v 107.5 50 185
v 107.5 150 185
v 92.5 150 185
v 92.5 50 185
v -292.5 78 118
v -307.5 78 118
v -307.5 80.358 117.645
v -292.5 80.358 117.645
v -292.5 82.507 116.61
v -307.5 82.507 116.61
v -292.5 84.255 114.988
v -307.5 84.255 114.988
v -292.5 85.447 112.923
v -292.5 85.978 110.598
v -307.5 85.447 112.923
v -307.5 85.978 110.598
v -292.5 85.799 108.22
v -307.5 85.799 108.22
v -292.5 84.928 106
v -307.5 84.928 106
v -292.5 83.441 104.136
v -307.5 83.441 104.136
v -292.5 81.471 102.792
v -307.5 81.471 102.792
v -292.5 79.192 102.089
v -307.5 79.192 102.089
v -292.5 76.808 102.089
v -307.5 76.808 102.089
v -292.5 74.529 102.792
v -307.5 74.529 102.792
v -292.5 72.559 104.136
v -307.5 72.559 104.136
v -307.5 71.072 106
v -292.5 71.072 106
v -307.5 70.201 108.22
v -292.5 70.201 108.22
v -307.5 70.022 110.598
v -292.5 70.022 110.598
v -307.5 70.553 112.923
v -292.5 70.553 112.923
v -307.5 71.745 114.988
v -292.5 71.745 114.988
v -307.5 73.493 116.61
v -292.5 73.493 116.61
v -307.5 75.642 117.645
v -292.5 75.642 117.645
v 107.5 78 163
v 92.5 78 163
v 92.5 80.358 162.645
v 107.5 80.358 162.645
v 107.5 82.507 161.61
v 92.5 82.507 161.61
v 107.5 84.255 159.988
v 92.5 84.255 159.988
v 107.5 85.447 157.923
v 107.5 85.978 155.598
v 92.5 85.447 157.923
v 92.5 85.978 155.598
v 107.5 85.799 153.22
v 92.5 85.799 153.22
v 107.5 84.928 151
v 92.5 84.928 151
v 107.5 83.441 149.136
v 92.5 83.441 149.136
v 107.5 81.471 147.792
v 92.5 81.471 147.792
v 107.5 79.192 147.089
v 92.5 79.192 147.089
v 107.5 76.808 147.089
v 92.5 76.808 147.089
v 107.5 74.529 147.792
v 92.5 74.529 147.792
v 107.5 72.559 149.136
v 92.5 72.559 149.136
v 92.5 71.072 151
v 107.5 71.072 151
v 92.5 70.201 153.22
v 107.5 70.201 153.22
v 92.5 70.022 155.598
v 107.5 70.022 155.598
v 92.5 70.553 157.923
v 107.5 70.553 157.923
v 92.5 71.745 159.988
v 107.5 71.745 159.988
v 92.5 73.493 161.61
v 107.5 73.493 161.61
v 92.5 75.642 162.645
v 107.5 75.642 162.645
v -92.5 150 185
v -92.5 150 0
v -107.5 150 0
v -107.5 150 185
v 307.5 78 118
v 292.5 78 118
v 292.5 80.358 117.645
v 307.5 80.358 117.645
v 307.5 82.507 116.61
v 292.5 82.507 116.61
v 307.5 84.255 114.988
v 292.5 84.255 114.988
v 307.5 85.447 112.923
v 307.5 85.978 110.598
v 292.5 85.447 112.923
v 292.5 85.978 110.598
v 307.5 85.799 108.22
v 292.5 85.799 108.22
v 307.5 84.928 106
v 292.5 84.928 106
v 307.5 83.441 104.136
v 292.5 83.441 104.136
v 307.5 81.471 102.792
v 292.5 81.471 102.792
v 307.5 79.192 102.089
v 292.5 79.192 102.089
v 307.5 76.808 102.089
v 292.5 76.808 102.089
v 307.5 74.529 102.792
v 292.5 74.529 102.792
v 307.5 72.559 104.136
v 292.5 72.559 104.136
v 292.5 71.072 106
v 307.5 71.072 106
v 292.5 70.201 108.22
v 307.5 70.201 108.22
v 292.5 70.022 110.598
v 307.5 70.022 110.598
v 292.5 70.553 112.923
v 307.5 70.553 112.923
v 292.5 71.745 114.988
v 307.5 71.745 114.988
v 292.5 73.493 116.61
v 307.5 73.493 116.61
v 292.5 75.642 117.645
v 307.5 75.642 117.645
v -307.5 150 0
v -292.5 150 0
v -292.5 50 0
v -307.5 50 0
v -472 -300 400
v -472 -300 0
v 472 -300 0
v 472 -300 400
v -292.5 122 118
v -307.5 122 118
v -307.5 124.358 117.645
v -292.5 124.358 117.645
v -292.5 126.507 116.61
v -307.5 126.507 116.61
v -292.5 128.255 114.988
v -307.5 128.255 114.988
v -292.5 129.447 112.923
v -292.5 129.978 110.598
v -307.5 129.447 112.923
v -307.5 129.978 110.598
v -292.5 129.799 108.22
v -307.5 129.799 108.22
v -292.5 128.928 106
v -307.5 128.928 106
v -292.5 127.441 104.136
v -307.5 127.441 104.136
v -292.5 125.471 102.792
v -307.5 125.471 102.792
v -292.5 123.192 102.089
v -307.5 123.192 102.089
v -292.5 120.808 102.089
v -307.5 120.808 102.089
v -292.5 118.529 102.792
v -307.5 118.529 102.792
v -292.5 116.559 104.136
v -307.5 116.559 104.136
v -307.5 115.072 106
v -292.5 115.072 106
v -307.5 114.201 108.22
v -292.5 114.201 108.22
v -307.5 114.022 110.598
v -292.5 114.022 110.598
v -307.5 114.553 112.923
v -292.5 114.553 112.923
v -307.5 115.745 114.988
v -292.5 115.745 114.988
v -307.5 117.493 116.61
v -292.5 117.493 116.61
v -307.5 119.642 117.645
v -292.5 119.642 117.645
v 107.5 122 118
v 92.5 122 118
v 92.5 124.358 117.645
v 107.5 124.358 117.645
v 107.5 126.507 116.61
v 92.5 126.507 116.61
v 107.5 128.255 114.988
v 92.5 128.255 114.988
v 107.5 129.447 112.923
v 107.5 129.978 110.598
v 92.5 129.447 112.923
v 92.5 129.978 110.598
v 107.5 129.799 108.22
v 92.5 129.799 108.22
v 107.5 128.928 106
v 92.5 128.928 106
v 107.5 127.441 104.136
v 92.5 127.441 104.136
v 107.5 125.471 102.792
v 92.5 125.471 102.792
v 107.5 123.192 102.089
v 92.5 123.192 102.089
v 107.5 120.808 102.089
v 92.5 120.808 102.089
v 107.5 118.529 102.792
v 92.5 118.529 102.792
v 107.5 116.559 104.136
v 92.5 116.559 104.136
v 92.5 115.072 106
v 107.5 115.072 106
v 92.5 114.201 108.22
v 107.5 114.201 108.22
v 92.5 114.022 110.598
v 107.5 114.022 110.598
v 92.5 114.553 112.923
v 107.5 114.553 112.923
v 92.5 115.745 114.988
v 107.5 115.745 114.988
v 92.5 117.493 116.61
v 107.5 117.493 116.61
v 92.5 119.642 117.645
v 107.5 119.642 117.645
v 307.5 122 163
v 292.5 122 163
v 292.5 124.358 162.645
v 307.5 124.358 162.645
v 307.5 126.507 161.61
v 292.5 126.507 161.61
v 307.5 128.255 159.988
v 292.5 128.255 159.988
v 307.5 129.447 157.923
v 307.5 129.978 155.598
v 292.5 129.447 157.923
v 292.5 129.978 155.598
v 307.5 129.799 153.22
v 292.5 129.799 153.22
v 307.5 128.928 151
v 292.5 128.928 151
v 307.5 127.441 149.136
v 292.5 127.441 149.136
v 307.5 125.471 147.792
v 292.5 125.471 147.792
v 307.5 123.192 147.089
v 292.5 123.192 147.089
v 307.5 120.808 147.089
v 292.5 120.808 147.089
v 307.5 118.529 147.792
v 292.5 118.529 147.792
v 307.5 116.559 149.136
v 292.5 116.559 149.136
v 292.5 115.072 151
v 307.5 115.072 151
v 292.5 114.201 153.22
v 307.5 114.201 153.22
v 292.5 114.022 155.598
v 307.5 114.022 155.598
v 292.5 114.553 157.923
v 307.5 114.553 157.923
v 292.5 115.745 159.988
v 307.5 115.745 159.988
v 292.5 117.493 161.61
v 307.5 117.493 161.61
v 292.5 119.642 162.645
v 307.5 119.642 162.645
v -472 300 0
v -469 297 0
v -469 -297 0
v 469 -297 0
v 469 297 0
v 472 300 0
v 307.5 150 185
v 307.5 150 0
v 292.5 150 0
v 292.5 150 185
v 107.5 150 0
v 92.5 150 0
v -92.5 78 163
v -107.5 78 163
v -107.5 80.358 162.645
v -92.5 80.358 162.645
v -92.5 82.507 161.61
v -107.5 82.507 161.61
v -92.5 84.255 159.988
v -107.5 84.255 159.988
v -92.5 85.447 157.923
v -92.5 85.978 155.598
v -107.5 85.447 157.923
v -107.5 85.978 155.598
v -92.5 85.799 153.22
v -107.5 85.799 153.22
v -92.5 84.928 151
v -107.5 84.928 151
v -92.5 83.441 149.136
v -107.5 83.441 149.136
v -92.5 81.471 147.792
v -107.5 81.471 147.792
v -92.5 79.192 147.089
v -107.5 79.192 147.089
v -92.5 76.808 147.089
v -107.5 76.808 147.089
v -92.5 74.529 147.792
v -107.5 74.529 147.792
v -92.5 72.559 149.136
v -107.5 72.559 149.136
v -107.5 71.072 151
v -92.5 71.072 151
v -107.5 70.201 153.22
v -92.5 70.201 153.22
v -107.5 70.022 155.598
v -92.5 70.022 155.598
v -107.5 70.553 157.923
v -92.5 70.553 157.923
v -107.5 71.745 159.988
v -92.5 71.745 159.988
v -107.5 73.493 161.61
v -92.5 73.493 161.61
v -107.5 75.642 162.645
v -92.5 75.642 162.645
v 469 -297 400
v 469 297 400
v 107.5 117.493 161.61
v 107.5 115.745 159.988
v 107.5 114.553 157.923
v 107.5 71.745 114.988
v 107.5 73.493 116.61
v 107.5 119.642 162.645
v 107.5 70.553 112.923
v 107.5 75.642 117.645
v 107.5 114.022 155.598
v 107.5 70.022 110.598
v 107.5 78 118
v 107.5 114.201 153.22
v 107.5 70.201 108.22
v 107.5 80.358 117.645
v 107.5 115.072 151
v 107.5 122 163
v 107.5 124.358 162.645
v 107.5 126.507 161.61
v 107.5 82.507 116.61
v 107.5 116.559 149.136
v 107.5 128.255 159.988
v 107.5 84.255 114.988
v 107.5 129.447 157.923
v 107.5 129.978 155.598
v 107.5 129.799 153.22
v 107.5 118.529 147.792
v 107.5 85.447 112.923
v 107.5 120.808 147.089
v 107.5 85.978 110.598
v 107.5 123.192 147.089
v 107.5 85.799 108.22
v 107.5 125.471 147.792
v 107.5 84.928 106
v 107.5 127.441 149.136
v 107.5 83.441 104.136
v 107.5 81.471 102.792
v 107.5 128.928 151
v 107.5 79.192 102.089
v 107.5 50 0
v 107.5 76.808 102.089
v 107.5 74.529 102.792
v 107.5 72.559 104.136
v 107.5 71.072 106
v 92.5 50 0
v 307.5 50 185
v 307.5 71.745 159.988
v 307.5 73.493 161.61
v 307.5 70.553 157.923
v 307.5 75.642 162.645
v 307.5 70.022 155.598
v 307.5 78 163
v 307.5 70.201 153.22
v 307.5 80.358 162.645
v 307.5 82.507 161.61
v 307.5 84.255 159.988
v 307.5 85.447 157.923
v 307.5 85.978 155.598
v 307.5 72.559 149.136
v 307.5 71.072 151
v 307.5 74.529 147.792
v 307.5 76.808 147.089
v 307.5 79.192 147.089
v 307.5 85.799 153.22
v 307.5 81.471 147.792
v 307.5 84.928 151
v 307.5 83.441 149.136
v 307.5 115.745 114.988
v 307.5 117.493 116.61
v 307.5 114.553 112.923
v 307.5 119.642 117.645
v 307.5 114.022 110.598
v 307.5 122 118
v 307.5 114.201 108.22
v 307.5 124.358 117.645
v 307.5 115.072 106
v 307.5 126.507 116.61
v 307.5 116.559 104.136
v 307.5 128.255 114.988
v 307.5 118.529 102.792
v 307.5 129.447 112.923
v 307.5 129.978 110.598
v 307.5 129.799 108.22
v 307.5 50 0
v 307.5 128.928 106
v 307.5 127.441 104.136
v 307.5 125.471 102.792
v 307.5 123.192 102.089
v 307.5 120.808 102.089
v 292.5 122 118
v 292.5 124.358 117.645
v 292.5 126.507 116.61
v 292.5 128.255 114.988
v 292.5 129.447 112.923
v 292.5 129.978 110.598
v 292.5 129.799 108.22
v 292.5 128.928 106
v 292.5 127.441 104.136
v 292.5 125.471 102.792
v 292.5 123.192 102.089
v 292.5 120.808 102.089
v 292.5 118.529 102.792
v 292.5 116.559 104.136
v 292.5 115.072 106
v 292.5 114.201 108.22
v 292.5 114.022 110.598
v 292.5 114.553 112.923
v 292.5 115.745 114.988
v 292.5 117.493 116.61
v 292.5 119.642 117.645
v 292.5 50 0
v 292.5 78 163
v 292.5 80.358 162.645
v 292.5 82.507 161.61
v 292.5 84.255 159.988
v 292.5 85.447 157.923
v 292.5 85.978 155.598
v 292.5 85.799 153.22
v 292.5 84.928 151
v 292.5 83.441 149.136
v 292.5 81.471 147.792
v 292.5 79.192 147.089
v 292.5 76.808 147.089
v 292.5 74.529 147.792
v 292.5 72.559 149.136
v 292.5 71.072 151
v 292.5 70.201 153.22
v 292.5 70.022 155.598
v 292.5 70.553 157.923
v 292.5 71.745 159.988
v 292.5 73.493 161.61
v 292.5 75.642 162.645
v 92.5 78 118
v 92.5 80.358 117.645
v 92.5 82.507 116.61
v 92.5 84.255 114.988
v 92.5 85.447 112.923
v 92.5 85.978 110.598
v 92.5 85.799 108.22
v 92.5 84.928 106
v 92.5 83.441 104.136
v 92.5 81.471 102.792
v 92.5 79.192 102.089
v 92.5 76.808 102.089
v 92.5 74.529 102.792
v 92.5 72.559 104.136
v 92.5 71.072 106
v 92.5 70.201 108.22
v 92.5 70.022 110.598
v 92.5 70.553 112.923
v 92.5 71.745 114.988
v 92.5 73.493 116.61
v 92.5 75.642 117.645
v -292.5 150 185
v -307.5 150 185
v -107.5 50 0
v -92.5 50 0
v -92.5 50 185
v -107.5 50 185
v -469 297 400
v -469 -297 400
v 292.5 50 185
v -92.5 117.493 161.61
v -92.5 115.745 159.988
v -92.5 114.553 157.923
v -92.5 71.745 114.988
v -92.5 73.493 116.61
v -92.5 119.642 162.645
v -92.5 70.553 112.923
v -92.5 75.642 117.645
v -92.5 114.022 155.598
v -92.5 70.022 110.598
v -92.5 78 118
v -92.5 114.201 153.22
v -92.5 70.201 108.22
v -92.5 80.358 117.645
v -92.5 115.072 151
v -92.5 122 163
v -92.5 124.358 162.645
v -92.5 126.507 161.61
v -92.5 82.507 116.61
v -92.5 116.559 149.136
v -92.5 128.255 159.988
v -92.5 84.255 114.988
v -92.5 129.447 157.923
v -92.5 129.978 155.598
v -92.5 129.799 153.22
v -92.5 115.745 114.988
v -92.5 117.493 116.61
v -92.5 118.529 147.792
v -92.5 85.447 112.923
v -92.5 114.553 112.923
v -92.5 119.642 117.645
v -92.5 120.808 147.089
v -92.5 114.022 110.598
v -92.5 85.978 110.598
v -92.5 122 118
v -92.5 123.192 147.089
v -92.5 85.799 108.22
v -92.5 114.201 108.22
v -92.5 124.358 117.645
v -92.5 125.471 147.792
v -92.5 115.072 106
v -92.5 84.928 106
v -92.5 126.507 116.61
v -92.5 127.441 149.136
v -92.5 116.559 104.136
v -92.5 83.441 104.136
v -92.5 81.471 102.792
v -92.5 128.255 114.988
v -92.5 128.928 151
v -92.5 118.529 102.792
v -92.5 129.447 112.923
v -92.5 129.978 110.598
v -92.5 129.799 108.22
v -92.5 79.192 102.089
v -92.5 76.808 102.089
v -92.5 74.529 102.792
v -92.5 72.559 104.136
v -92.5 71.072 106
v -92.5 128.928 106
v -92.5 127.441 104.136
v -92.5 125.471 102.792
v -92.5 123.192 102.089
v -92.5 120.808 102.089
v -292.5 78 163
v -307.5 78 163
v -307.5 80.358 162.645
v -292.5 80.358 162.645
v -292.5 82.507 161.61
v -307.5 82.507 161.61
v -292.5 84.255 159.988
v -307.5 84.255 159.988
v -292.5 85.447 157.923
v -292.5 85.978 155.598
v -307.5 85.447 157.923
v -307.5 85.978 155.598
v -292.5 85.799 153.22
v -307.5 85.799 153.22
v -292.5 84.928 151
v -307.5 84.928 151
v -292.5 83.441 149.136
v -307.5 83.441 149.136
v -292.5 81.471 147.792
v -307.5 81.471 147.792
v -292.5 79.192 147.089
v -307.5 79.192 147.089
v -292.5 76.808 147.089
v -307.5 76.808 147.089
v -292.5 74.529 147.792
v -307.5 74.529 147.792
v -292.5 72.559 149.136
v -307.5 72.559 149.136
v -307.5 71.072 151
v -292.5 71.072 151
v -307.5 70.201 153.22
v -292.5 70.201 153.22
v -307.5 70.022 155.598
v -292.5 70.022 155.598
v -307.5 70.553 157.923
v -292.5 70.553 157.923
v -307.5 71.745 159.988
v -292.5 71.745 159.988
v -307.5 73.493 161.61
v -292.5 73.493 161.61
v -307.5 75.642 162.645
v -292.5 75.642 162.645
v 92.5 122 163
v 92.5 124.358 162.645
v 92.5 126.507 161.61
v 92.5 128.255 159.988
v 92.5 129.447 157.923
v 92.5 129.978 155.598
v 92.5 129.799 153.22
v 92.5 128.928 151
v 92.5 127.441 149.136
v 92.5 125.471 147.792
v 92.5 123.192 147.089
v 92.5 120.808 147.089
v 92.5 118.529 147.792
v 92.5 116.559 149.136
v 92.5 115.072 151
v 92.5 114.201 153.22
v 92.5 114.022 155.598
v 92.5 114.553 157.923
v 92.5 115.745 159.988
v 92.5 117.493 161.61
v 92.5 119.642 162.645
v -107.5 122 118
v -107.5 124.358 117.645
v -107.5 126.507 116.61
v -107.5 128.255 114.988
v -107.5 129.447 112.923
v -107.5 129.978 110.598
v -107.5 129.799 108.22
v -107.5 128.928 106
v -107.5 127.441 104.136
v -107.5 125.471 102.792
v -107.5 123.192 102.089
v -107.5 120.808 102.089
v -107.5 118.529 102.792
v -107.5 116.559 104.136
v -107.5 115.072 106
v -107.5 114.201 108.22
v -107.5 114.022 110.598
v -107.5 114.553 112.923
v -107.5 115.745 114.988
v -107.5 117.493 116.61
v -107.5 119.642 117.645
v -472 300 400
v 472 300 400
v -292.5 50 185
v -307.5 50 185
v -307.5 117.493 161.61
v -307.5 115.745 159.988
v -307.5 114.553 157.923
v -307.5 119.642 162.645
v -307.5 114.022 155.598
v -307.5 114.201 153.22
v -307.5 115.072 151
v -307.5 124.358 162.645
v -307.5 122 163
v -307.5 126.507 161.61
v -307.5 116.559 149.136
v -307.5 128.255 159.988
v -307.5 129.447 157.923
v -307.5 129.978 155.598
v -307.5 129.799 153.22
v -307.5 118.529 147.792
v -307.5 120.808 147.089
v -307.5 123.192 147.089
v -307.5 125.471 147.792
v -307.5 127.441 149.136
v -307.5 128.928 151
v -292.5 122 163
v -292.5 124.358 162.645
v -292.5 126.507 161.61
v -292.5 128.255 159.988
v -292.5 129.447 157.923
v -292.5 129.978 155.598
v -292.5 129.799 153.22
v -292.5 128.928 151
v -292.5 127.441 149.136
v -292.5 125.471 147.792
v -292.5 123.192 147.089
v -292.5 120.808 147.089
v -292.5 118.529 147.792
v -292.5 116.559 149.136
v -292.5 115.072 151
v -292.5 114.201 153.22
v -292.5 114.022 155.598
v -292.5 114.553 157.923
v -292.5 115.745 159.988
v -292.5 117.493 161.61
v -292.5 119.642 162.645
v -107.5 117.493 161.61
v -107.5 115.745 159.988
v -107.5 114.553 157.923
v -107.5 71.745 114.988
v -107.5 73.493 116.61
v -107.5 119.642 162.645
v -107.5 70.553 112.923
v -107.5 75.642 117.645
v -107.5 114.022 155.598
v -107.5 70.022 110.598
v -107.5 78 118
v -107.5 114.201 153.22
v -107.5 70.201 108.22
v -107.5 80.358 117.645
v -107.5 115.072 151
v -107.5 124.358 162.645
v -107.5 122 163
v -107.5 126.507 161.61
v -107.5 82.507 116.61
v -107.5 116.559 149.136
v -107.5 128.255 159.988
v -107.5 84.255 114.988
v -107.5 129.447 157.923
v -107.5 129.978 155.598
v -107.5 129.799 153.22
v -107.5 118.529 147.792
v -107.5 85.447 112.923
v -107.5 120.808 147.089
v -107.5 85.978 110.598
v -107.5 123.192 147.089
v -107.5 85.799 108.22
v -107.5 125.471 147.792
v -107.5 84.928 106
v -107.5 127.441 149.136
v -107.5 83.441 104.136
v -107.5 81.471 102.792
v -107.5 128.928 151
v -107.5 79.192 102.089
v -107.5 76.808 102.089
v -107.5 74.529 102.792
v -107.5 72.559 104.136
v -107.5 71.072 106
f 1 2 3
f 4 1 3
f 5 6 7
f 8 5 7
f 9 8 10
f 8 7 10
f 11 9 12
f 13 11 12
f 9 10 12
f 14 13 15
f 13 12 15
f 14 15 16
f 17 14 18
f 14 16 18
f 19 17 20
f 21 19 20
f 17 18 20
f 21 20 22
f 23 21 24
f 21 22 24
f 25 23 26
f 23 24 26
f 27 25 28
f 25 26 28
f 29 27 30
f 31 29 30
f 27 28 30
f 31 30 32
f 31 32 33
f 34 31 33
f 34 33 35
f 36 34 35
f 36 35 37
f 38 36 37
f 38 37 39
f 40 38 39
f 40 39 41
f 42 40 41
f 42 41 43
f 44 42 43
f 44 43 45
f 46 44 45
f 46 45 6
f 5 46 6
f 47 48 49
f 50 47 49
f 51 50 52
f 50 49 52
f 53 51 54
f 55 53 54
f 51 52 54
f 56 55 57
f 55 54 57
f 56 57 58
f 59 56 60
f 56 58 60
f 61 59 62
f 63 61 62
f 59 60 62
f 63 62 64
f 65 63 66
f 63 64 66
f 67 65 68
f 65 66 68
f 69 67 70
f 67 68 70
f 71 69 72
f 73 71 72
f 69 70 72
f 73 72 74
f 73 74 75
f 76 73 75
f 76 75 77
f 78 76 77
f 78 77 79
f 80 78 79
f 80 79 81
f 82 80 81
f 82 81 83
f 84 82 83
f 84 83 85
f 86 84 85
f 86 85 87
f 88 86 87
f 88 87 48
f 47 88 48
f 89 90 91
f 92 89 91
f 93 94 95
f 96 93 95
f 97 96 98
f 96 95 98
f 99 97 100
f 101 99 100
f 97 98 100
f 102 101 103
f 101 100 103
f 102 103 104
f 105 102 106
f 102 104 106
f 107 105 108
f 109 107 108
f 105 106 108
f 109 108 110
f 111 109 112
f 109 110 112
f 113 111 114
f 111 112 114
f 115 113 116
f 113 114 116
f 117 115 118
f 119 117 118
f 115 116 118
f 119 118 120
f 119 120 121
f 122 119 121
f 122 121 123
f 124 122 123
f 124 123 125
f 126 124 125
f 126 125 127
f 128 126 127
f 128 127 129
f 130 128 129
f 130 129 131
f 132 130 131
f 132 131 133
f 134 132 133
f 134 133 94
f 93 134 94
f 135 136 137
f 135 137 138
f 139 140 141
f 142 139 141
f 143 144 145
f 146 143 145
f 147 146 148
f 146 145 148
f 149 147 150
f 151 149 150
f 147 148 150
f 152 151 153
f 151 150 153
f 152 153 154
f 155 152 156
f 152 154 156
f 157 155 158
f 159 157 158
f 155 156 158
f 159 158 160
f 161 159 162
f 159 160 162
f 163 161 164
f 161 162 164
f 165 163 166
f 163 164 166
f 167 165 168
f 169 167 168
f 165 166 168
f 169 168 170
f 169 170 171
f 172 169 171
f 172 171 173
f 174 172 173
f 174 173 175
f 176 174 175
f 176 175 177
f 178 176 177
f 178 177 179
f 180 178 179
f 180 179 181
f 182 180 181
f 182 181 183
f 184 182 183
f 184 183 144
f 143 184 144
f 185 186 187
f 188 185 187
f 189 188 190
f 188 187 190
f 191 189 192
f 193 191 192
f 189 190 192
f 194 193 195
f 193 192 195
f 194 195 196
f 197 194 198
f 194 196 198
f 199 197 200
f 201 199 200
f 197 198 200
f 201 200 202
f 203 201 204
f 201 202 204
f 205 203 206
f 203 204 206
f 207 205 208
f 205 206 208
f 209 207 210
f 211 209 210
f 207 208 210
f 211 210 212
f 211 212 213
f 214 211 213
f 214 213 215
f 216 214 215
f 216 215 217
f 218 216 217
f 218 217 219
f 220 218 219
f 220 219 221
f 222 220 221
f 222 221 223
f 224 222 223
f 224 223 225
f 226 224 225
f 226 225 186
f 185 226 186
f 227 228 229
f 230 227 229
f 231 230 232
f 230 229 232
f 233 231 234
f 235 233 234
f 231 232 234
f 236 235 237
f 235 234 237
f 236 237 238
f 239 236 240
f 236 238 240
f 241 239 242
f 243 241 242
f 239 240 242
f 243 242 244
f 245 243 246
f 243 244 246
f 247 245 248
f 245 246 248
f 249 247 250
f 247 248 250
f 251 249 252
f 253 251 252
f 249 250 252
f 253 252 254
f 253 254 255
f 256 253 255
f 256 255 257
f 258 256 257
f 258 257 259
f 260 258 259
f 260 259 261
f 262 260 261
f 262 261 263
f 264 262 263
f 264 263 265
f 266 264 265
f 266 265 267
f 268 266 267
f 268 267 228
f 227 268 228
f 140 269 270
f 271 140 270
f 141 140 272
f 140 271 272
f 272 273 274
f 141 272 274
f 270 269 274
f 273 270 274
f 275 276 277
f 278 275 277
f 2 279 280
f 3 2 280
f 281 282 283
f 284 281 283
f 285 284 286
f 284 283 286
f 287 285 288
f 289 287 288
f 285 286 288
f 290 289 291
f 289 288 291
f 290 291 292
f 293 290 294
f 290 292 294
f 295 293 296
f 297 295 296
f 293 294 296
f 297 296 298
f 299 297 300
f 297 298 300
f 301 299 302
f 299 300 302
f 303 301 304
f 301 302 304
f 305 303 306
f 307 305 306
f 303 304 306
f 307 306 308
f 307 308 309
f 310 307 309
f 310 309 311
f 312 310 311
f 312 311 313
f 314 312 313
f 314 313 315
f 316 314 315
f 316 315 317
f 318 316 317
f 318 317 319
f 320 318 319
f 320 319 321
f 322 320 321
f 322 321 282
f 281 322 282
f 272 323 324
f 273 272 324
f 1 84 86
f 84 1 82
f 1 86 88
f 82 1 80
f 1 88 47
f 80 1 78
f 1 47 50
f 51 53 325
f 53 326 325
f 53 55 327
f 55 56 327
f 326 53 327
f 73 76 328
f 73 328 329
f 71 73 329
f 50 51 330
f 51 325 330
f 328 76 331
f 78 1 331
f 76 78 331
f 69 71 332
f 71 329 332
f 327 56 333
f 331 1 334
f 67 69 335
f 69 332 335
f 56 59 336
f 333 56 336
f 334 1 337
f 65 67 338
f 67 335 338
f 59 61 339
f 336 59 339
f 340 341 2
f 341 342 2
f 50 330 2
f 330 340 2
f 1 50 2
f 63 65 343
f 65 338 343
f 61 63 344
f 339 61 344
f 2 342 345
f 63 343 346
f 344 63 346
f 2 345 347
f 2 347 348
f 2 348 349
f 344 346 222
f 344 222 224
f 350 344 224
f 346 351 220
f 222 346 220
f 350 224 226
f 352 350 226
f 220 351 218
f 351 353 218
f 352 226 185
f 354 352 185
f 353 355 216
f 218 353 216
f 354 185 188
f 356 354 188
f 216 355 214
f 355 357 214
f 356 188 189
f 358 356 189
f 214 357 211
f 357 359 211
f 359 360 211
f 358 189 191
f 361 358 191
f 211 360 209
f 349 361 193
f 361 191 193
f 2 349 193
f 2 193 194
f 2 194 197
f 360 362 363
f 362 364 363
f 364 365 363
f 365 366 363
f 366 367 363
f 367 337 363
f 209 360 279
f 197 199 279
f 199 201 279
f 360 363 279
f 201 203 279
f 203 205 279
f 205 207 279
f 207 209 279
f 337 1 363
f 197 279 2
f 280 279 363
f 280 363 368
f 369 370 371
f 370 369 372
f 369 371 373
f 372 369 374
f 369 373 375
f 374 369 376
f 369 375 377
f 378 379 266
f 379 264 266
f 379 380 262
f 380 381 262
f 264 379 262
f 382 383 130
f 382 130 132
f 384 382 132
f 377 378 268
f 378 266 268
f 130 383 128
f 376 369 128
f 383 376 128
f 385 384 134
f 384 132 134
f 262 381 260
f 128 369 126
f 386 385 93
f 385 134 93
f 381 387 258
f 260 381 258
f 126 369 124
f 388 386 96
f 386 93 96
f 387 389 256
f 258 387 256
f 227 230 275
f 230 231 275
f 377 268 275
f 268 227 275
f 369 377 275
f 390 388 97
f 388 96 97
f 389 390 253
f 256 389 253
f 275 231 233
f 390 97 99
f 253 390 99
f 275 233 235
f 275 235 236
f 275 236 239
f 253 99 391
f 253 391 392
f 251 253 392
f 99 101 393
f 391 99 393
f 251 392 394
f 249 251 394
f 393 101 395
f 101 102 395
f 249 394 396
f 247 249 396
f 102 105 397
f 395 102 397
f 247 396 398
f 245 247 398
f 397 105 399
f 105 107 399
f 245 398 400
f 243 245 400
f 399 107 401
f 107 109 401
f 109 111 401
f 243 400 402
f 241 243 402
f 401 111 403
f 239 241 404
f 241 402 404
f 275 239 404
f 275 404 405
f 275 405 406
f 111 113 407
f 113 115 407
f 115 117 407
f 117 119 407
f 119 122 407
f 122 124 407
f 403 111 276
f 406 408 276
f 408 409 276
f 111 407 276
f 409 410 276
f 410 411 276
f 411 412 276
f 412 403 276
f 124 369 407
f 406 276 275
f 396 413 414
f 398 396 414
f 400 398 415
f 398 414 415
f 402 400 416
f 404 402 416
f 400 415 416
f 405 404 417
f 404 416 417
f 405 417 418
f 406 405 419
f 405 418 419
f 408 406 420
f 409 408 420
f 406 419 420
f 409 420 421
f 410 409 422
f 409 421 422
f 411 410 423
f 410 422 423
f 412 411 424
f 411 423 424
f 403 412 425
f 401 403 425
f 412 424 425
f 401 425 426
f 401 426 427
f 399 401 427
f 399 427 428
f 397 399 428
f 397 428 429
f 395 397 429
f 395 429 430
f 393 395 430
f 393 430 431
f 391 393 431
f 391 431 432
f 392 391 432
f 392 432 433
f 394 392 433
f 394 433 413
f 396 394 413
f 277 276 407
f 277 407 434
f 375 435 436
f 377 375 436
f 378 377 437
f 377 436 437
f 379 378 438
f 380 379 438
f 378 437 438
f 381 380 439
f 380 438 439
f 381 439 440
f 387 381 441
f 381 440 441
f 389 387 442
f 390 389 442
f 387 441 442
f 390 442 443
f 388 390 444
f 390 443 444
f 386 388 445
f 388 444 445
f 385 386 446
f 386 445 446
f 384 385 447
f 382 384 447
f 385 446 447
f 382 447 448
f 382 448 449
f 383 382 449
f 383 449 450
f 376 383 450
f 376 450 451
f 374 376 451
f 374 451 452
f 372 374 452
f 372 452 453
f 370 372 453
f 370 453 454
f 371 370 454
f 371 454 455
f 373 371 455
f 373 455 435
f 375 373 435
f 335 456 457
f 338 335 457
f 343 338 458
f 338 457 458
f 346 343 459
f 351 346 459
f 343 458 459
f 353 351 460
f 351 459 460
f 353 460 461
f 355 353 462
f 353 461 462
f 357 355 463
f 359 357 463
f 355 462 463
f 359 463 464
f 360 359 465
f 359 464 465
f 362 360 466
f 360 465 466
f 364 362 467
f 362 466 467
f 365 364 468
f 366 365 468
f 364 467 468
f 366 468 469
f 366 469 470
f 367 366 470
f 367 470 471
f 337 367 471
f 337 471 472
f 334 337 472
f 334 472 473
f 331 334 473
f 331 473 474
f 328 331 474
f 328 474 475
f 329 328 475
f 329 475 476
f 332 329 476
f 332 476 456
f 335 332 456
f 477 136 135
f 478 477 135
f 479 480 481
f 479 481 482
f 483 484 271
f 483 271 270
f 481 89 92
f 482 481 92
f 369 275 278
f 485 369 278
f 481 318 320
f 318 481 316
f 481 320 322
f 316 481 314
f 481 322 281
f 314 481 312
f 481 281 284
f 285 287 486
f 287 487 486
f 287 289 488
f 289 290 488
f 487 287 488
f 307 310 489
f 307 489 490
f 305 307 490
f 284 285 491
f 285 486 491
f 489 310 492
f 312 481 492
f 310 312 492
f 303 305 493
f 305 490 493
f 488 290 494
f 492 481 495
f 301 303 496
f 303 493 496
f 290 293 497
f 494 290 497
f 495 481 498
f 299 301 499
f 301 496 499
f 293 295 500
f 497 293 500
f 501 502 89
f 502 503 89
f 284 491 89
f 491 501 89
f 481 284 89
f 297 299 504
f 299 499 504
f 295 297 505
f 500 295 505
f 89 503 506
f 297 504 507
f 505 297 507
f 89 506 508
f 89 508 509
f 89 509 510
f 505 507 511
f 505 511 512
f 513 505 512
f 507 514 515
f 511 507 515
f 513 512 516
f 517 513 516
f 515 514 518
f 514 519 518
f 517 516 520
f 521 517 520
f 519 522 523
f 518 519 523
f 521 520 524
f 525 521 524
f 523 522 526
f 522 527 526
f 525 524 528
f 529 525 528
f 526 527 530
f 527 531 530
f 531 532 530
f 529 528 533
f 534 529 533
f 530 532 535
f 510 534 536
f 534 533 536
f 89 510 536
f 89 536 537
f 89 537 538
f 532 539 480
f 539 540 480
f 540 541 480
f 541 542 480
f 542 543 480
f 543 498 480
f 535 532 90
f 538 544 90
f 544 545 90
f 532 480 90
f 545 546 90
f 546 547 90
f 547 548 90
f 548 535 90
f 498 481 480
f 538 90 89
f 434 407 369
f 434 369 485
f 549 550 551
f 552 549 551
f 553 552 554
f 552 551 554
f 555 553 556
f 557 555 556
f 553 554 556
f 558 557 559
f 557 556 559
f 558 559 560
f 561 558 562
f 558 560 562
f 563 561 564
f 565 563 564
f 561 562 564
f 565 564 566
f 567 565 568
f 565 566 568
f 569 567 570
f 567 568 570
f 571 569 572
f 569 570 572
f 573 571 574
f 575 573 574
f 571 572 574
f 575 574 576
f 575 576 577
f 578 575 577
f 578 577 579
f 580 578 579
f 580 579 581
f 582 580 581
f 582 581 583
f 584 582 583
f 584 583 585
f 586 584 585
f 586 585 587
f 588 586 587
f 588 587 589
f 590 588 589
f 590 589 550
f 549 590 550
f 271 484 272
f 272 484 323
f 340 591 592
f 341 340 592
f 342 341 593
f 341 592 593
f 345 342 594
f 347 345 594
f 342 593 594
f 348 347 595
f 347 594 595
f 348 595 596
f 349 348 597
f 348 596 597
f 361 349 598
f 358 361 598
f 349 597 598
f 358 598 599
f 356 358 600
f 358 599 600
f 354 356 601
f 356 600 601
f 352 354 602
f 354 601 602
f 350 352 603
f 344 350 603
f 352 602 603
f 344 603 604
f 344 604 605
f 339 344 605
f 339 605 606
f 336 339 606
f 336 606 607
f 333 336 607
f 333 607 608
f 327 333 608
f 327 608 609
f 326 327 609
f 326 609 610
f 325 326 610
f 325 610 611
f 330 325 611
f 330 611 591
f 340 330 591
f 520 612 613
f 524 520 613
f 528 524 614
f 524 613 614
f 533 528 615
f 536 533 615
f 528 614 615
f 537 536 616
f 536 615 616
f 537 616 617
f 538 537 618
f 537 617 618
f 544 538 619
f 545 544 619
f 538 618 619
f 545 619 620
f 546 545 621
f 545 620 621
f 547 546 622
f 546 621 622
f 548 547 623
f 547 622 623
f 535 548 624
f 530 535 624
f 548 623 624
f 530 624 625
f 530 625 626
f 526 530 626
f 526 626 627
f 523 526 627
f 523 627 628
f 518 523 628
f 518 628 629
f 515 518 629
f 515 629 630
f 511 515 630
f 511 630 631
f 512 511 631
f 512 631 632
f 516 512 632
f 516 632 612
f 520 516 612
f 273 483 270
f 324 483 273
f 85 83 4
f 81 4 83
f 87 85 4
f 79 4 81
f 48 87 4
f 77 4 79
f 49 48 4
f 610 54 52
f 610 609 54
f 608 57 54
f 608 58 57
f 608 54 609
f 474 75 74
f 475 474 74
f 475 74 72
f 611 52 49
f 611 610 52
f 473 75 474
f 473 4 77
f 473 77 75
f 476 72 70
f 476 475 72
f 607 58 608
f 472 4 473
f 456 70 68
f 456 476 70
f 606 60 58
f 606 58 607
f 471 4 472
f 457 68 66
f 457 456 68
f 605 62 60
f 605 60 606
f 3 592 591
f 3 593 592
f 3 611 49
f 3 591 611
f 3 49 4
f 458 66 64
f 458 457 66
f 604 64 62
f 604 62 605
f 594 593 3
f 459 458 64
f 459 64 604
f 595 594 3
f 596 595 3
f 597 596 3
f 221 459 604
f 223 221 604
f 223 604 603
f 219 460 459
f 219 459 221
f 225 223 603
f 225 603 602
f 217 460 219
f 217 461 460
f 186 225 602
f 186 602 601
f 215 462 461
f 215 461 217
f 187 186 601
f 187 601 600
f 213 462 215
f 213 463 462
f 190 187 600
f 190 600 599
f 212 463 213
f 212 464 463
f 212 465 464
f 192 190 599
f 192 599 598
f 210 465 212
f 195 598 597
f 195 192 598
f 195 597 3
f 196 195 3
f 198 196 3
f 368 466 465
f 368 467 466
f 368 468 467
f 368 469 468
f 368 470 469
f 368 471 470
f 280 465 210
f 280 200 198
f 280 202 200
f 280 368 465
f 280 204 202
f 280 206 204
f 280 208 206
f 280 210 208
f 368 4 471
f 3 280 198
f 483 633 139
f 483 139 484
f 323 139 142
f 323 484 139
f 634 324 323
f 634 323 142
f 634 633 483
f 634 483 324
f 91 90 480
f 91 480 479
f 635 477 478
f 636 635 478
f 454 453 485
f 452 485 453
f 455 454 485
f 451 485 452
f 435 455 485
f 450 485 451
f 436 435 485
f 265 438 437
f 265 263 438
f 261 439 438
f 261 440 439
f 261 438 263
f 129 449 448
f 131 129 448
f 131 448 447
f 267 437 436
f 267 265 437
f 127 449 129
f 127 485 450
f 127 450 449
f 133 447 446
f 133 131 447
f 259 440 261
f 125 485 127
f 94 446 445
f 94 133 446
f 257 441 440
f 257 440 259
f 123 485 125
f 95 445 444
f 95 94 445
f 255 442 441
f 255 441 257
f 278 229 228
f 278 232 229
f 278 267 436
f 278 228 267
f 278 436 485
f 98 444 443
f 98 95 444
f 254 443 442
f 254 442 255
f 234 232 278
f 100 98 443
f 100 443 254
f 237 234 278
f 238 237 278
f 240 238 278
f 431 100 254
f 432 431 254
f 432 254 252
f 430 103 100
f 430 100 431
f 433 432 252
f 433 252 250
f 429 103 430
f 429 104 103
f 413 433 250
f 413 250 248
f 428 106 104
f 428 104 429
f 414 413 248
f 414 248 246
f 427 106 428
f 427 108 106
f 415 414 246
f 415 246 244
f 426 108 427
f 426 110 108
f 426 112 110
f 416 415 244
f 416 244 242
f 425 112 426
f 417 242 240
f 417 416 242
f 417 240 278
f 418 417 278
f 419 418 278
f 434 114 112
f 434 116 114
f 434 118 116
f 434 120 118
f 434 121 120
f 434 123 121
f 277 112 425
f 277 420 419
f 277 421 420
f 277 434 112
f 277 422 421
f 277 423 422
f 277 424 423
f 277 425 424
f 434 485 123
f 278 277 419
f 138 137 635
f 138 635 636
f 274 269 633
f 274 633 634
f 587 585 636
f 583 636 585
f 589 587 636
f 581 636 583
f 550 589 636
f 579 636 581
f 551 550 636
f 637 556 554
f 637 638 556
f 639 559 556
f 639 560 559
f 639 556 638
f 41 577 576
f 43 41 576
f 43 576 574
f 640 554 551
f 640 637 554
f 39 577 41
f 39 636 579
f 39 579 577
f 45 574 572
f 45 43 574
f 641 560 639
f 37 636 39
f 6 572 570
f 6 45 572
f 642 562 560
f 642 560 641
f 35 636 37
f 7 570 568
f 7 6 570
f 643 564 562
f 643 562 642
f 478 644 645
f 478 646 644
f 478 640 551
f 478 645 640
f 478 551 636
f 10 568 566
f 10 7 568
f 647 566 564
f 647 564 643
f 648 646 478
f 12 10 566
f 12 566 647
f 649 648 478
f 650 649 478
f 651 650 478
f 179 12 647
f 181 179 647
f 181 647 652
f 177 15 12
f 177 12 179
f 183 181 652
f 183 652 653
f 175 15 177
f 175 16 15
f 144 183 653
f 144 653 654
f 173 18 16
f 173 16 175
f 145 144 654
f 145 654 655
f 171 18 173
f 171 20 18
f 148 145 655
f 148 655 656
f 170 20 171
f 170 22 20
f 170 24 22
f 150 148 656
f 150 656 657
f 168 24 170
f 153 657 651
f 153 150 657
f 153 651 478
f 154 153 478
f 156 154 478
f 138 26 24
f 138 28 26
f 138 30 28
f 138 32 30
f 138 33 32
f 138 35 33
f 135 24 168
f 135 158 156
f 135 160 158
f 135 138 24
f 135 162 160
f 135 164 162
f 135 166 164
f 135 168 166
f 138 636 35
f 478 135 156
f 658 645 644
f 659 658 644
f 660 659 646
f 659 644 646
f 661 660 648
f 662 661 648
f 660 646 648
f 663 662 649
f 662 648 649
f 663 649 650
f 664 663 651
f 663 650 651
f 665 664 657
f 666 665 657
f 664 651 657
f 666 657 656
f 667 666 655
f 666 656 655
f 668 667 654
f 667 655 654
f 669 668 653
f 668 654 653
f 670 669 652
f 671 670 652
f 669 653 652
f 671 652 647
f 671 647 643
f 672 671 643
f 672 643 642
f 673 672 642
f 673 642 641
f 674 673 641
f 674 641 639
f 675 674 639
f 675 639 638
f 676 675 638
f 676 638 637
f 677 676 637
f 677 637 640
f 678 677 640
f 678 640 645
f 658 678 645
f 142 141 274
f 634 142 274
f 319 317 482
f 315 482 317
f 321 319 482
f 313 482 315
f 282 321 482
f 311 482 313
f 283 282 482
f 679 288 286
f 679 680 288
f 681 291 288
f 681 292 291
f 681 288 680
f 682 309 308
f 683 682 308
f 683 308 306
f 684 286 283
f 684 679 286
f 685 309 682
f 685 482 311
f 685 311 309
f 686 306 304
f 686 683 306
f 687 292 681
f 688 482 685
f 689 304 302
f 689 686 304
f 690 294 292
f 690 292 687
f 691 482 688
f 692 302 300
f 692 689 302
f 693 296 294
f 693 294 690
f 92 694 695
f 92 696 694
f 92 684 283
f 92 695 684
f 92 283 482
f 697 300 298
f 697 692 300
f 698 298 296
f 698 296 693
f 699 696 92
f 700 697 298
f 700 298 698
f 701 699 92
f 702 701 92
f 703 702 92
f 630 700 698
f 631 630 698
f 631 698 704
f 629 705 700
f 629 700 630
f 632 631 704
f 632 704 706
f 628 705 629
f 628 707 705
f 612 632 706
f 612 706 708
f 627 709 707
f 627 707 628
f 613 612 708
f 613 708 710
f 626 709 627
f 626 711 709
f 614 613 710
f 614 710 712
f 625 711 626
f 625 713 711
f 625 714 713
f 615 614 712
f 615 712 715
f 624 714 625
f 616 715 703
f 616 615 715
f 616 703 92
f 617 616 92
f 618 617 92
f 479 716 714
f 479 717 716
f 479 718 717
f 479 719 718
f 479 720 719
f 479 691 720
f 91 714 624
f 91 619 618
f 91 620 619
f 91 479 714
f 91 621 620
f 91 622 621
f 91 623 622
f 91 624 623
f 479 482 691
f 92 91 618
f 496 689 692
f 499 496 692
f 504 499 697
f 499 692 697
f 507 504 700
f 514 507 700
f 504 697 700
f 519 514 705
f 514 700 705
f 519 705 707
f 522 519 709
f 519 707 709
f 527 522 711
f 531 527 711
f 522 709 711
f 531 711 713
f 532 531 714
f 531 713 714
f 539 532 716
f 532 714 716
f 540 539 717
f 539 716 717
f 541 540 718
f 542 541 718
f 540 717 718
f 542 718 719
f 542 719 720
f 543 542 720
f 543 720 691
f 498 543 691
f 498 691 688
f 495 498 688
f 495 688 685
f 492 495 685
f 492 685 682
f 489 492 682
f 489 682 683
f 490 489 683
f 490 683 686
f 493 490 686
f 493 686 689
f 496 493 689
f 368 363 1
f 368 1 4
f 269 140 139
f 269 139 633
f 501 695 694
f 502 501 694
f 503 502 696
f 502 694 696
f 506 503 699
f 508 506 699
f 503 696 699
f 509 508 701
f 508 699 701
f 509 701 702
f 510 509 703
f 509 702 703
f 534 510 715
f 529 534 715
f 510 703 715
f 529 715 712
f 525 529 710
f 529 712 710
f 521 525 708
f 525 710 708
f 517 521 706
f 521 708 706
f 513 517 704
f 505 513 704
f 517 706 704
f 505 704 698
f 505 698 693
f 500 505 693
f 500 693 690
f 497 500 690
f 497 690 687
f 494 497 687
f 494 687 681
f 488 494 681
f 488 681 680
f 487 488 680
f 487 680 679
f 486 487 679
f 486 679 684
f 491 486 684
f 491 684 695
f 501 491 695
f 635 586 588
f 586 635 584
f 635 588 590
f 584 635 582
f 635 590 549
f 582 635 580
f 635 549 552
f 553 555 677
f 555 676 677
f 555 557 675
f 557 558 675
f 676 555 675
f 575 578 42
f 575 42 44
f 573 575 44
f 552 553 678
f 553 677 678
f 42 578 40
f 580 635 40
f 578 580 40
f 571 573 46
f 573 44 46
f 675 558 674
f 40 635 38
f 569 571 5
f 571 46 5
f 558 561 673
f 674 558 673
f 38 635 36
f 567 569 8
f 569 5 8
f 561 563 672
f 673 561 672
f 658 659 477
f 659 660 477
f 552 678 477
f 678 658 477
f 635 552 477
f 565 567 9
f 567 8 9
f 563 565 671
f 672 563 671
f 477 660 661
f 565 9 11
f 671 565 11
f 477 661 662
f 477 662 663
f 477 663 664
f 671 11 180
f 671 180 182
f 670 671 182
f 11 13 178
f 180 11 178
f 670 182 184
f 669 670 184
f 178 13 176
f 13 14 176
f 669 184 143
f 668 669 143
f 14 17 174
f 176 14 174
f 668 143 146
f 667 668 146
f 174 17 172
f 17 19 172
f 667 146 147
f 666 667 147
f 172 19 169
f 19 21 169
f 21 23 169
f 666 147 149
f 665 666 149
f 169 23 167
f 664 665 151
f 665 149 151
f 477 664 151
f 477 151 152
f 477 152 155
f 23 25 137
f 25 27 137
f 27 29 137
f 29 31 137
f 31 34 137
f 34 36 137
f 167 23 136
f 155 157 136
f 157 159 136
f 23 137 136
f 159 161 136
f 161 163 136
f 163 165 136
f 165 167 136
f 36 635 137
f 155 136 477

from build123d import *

# Parameters (mm, degrees)
CROQUIS1_W                = 944
CROQUIS1_H                = 600
SALIENTE_EXTRUIR1_DEPTH   = 400
CROQUIS2_W                = 938
CROQUIS2_H                = 594
CORTAR_EXTRUIR1_DEPTH     = 400
CROQUIS3_W                = 15
CROQUIS3_H                = 100
SALIENTE_EXTRUIR2_DEPTH   = 185
SALIENTE_EXTRUIR2_2_DEPTH = 185
SALIENTE_EXTRUIR2_3_DEPTH = 185
SALIENTE_EXTRUIR2_4_DEPTH = 185
CROQUIS5_R                = 8
CORTAR_EXTRUIR2_DEPTH     = 615


with BuildPart() as part:
    # Croquis1 → Saliente-Extruir1 (new body)
    with BuildSketch(Plane.XY):
        Rectangle(CROQUIS1_W, CROQUIS1_H)
    extrude(amount=SALIENTE_EXTRUIR1_DEPTH)

    # Croquis2 → Cortar-Extruir1 (cut)
    with BuildSketch(Plane.XY.offset(400)):
        Rectangle(CROQUIS2_W, CROQUIS2_H)
    extrude(amount=-CORTAR_EXTRUIR1_DEPTH, mode=Mode.SUBTRACT)


with BuildPart() as body_2:
    # Croquis3 → Saliente-Extruir2 (new body)
    with BuildSketch(Plane(origin=(0, 0, 0), x_dir=(-1, 0, 0), z_dir=(0, 0, -1))):
        with Locations((-300, 100)):
            Rectangle(CROQUIS3_W, CROQUIS3_H)
    extrude(amount=-SALIENTE_EXTRUIR2_DEPTH)


with BuildPart() as body_3:
    # Croquis3 → Saliente-Extruir2 2 (new body)
    with BuildSketch(Plane(origin=(0, 0, 0), x_dir=(-1, 0, 0), z_dir=(0, 0, -1))):
        with Locations((-100, 100)):
            Rectangle(CROQUIS3_W, CROQUIS3_H)
    extrude(amount=-SALIENTE_EXTRUIR2_2_DEPTH)


with BuildPart() as body_4:
    # Croquis3 → Saliente-Extruir2 3 (new body)
    with BuildSketch(Plane(origin=(0, 0, 0), x_dir=(-1, 0, 0), z_dir=(0, 0, -1))):
        with Locations((100, 100)):
            Rectangle(CROQUIS3_W, CROQUIS3_H)
    extrude(amount=-SALIENTE_EXTRUIR2_3_DEPTH)


with BuildPart() as body_5:
    # Croquis3 → Saliente-Extruir2 4 (new body)
    with BuildSketch(Plane(origin=(0, 0, 0), x_dir=(-1, 0, 0), z_dir=(0, 0, -1))):
        with Locations((300, 100)):
            Rectangle(CROQUIS3_W, CROQUIS3_H)
    extrude(amount=-SALIENTE_EXTRUIR2_4_DEPTH)


with BuildPart() as cortar_extruir2_tool:
    # Croquis5 → Cortar-Extruir2 (new body)
    with BuildSketch(Plane.ZY.offset(307.5)):
        with Locations((155, 122)):
            Circle(CROQUIS5_R)
        with Locations((155, 78)):
            Circle(CROQUIS5_R)
        with Locations((110, 122)):
            Circle(CROQUIS5_R)
        with Locations((110, 78)):
            Circle(CROQUIS5_R)
    extrude(amount=-CORTAR_EXTRUIR2_DEPTH)


with BuildPart() as body_2_1:
    add(body_2.part)

    # Cortar-Extruir2: cut by cortar_extruir2_tool
    add(cortar_extruir2_tool.part, mode=Mode.SUBTRACT)


with BuildPart() as body_3_1:
    add(body_3.part)

    # Cortar-Extruir2: cut by cortar_extruir2_tool
    add(cortar_extruir2_tool.part, mode=Mode.SUBTRACT)


with BuildPart() as body_4_1:
    add(body_4.part)

    # Cortar-Extruir2: cut by cortar_extruir2_tool
    add(cortar_extruir2_tool.part, mode=Mode.SUBTRACT)


with BuildPart() as body_5_1:
    add(body_5.part)

    # Cortar-Extruir2: cut by cortar_extruir2_tool
    add(cortar_extruir2_tool.part, mode=Mode.SUBTRACT)


solid = Compound([part.part, body_2_1.part, body_3_1.part, body_4_1.part, body_5_1.part])
